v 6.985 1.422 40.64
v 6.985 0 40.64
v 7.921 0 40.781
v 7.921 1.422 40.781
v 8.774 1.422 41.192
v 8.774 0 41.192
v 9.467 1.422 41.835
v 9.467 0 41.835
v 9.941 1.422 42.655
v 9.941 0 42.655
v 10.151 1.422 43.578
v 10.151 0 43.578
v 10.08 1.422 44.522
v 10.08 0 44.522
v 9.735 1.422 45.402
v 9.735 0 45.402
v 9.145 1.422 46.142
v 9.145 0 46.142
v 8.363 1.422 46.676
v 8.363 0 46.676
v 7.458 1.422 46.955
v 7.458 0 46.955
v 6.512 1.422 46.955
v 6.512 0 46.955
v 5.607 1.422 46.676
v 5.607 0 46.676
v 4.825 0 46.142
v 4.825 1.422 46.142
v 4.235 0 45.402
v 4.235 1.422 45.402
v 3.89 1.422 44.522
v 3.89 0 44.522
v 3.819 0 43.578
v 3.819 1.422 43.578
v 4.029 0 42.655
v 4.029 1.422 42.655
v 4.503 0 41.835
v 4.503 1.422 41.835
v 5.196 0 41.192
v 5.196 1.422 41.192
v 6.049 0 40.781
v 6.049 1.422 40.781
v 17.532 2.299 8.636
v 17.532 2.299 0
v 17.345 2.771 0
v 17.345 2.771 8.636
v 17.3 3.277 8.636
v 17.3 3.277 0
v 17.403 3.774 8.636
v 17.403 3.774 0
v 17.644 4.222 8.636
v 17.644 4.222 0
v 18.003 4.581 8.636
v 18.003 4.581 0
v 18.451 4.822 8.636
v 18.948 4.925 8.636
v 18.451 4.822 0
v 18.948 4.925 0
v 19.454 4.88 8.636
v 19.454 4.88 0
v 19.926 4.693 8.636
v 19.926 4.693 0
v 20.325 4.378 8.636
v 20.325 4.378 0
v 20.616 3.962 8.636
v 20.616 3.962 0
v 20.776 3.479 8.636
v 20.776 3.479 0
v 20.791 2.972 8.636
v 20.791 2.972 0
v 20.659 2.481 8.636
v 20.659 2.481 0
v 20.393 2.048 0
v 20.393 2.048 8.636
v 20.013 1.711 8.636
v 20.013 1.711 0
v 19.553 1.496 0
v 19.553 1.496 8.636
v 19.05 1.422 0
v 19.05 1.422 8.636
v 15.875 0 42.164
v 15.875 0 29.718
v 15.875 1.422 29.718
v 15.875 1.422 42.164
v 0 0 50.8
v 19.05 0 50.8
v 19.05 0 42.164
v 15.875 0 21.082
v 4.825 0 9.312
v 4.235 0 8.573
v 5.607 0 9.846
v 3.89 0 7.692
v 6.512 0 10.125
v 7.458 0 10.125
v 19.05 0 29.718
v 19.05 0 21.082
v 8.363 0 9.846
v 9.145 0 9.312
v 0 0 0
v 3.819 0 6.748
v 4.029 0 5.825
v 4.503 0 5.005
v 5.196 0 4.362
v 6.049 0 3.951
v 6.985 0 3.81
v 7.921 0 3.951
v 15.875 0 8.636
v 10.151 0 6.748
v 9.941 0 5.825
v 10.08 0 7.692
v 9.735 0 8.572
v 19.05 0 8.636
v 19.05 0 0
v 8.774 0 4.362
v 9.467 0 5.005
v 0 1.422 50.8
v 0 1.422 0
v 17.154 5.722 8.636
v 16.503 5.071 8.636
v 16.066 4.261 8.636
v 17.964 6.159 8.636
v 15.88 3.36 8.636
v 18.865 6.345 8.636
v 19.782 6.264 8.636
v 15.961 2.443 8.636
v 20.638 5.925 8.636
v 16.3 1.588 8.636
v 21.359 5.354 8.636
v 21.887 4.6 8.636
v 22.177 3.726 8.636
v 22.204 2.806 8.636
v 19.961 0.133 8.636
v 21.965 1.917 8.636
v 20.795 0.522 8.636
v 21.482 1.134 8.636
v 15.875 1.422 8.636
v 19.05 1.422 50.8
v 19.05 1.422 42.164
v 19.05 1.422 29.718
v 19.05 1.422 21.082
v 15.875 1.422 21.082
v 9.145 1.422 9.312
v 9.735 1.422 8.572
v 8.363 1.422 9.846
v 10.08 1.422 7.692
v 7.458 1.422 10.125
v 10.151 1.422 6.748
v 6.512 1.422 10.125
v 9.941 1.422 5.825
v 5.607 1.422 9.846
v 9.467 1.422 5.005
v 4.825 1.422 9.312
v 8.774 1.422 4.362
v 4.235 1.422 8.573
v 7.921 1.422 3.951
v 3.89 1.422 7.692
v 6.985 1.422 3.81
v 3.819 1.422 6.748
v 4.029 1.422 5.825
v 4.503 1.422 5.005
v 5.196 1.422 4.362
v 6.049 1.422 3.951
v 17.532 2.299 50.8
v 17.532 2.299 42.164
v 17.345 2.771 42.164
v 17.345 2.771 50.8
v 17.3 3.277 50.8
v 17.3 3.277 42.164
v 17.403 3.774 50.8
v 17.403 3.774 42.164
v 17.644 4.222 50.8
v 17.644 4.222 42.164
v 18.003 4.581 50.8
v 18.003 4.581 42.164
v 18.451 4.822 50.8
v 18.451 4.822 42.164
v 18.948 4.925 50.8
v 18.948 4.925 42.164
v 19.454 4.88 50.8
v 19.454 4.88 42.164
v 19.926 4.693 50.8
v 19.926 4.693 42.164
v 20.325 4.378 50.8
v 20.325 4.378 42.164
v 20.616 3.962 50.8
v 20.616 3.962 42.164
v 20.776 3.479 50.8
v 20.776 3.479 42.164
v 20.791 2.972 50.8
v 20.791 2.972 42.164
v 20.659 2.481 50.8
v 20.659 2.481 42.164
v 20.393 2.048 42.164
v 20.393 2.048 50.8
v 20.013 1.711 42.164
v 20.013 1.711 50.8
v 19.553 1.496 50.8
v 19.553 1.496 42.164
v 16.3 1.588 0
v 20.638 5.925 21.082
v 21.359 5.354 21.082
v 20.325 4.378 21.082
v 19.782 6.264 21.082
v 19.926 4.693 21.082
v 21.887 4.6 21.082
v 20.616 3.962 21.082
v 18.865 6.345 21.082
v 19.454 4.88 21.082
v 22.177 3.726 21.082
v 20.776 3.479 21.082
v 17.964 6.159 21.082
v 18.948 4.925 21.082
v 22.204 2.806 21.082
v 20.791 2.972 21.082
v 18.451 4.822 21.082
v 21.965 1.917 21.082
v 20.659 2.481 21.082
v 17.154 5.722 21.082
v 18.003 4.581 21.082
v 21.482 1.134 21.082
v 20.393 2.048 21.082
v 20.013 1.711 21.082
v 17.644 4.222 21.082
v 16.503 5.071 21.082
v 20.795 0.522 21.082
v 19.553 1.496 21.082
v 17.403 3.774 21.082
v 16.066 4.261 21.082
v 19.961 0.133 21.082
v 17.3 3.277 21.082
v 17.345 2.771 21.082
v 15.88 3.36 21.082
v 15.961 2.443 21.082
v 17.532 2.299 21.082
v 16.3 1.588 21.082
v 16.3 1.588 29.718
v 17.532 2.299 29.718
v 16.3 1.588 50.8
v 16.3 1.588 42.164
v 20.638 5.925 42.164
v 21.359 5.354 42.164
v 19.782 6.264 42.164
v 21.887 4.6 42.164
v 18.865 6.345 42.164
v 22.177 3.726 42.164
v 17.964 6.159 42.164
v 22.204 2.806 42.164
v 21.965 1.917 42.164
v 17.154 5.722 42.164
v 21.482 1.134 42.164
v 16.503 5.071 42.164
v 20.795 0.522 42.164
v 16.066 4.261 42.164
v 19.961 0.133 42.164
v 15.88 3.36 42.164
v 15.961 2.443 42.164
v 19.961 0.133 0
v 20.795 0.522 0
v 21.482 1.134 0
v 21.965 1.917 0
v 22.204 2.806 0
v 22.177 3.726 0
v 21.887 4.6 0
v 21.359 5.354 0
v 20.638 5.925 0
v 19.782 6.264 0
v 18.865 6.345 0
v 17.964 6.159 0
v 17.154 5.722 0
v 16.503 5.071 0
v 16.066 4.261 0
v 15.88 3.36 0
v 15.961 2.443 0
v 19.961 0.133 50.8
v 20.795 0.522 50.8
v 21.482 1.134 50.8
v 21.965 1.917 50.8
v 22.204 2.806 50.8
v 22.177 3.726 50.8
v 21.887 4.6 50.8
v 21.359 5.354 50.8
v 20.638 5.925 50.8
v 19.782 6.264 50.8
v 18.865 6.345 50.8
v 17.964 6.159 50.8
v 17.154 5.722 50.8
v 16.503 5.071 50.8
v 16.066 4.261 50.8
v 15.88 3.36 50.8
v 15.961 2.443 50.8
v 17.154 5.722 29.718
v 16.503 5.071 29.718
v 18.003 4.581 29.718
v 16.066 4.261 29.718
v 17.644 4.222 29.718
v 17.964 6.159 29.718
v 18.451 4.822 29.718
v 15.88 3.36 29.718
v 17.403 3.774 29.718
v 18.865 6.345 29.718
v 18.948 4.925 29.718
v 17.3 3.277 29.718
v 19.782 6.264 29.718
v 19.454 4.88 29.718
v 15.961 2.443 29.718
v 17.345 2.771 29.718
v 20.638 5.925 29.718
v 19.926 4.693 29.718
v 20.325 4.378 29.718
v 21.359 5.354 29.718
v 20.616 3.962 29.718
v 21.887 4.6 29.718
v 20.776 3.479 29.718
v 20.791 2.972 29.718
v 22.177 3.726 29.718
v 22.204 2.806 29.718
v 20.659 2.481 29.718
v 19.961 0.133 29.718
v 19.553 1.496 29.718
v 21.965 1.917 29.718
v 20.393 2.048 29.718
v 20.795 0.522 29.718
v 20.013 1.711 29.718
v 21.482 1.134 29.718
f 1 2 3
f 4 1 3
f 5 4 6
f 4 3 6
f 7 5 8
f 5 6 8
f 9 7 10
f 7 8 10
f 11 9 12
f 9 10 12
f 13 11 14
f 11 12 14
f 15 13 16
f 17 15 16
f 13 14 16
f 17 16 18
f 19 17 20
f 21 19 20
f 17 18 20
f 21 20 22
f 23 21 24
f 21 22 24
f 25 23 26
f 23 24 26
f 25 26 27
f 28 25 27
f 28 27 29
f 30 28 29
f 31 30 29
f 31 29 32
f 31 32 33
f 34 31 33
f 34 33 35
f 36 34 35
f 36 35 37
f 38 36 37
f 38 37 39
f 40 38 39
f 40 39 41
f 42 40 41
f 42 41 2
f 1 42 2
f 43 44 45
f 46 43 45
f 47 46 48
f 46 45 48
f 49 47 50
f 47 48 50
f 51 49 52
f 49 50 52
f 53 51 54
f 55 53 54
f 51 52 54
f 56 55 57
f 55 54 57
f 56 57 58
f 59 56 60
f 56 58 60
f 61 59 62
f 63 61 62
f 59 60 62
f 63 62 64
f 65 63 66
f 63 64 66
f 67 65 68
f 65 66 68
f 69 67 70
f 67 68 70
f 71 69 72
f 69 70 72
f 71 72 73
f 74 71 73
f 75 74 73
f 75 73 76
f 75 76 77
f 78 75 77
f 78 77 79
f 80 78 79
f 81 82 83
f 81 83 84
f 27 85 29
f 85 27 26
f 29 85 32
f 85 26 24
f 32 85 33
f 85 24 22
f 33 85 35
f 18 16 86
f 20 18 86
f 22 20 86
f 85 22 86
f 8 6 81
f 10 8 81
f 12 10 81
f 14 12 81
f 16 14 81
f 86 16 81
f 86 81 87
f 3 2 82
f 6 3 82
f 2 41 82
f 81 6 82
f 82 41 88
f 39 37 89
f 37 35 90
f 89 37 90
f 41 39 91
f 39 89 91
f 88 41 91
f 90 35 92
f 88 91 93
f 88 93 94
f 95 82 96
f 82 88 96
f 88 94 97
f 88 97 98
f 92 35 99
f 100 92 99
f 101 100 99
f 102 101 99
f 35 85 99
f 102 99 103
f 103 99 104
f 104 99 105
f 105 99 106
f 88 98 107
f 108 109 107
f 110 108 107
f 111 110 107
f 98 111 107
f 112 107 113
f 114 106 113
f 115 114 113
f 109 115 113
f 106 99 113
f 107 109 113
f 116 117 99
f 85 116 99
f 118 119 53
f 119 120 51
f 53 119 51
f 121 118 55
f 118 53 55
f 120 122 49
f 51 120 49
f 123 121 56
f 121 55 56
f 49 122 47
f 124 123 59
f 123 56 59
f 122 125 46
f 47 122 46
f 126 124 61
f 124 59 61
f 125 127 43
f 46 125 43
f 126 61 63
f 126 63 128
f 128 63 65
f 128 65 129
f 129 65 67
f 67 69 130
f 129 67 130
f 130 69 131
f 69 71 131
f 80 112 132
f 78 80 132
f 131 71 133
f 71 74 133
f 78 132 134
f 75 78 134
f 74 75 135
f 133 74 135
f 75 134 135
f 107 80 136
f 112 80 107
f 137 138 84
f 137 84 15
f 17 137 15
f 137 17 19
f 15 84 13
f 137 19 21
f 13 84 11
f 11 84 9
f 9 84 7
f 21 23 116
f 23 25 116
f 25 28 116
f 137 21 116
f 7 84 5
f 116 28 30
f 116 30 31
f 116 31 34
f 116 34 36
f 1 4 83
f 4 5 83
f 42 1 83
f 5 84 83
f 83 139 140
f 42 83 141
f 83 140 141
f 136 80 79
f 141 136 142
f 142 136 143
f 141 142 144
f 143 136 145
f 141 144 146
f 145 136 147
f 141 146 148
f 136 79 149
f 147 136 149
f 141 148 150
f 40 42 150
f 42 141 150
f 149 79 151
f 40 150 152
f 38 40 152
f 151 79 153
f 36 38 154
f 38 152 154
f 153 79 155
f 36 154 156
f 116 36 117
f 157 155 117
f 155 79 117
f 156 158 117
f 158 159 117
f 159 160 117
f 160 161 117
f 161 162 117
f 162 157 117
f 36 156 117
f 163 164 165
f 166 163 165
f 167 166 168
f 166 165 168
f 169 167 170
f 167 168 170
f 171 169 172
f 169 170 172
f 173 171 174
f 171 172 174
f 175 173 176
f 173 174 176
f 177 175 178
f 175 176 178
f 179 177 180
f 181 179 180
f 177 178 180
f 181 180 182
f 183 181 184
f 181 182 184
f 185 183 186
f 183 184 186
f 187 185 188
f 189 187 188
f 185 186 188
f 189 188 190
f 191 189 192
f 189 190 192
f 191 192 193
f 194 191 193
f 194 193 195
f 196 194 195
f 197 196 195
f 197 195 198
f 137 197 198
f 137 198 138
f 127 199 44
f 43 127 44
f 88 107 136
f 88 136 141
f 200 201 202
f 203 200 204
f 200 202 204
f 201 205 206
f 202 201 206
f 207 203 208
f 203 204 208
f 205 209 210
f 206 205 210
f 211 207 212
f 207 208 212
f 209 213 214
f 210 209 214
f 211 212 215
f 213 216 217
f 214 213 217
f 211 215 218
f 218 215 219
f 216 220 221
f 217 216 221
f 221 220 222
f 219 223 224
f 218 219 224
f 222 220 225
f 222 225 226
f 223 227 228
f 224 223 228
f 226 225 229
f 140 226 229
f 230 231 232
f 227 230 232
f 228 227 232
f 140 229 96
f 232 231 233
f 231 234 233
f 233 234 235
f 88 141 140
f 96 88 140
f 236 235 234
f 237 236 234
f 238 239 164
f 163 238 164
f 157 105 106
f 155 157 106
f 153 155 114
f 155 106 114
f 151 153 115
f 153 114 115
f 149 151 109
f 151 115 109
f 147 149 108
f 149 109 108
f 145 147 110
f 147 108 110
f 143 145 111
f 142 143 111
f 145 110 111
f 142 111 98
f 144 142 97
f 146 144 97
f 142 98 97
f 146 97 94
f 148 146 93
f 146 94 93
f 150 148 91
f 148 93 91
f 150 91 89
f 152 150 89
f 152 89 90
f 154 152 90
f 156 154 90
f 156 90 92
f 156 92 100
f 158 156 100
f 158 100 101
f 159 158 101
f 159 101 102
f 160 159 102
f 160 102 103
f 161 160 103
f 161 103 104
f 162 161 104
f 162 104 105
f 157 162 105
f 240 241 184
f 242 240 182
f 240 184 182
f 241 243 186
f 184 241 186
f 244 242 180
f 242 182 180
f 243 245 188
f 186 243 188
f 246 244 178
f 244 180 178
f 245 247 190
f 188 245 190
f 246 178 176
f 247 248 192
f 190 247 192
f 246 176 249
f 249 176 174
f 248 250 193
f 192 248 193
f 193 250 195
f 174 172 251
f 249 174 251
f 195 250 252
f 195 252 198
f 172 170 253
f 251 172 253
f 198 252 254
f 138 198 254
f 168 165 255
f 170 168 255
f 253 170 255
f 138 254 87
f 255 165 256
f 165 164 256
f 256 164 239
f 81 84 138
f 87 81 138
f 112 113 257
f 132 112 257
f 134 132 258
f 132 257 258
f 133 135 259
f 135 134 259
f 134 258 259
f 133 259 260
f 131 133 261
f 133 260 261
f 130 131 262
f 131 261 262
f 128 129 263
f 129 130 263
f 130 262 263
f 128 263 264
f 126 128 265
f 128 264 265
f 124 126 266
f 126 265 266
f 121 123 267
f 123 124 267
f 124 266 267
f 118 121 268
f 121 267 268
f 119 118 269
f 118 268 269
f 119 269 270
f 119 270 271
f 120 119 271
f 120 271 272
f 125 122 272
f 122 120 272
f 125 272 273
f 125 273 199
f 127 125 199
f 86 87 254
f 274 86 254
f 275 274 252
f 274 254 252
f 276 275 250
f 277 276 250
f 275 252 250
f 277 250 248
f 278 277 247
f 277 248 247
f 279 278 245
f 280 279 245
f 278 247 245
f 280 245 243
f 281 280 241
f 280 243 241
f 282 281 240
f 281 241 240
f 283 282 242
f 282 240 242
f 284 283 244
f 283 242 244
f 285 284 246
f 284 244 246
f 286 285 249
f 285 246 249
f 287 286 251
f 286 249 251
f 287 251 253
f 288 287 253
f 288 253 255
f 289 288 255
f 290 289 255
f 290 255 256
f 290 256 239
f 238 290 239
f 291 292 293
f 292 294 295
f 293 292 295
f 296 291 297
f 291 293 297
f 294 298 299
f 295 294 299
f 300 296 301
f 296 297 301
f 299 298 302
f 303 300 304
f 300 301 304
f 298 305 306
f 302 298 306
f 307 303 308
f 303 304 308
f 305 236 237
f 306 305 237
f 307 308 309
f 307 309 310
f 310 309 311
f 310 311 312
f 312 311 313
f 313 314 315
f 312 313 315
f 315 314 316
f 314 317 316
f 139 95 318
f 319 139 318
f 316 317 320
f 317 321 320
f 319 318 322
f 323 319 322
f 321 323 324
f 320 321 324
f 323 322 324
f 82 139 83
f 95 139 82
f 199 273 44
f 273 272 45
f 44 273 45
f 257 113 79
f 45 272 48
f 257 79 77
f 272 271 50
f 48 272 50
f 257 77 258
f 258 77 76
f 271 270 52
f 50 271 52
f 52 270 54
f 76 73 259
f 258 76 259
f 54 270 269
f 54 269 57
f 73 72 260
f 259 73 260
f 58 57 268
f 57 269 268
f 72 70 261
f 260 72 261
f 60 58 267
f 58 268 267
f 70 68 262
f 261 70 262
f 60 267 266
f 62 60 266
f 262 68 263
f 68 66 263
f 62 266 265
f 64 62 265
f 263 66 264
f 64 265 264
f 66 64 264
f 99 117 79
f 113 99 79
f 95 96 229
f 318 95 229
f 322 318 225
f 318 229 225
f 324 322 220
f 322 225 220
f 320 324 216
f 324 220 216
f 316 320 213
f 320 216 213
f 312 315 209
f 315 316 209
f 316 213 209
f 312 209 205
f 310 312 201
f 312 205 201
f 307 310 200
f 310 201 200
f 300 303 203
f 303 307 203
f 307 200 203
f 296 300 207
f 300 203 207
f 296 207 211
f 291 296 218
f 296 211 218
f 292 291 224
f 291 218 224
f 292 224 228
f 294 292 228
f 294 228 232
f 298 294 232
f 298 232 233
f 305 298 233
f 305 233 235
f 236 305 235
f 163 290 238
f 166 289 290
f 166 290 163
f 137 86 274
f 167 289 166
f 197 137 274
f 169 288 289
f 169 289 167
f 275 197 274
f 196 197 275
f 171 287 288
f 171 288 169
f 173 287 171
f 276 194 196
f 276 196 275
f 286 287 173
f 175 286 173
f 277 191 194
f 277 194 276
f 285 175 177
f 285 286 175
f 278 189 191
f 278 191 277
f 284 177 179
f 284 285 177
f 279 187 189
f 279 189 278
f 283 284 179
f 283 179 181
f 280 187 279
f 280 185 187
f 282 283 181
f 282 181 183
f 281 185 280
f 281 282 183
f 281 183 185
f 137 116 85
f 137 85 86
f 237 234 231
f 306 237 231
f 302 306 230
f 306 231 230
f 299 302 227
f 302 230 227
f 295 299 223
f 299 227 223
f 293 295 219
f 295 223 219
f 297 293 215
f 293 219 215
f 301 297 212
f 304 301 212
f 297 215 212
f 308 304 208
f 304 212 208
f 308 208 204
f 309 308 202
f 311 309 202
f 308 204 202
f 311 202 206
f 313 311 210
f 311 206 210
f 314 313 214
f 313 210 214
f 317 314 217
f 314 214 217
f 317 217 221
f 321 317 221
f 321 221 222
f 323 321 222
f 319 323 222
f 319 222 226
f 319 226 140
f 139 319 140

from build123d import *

# Parameters (mm, degrees)
BOSS_EXTRUDE1_DEPTH = 50.8
SKETCH2_W           = 3.175
SKETCH2_H           = 12.446
SKETCH2_R           = 3.175
CUT_EXTRUDE1_DEPTH  = 56.811406764


with BuildPart() as part:
    # Sketch1 → Boss-Extrude1 (new body)
    with BuildSketch(Plane.XY):
        with BuildLine():
            Line((0, 0), (19.05, 0))
            ThreePointArc((19.05, 0), (20.6375, 5.924630657), (16.300369343, 1.5875))
            Line((16.300369343, 1.5875), (17.532203877, 2.2987))
            ThreePointArc((17.532203877, 2.2987), (19.9263, 4.692796123), (19.05, 1.4224))
            Line((19.05, 1.4224), (0, 1.4224))
            Line((0, 1.4224), (0, 0))
        make_face()
    extrude(amount=BOSS_EXTRUDE1_DEPTH)

    # Sketch2 → Cut-Extrude1 (cut, through all)
    with BuildSketch(Plane.XZ):
        with Locations((20.6375, 14.859)):
            Rectangle(SKETCH2_W, SKETCH2_H)
        with Locations((17.4625, 14.859)):
            Rectangle(SKETCH2_W, SKETCH2_H)
        with Locations((20.6375, 35.941)):
            Rectangle(SKETCH2_W, SKETCH2_H)
        with Locations((17.4625, 35.941)):
            Rectangle(SKETCH2_W, SKETCH2_H)
        with Locations(Location((6.985, 43.815, 0), (0, 0, 270))):
            Circle(SKETCH2_R)
        with Locations(Location((6.985, 6.985, 0), (0, 0, 270))):
            Circle(SKETCH2_R)
    extrude(amount=-CUT_EXTRUDE1_DEPTH, mode=Mode.SUBTRACT)


solid = part.part
